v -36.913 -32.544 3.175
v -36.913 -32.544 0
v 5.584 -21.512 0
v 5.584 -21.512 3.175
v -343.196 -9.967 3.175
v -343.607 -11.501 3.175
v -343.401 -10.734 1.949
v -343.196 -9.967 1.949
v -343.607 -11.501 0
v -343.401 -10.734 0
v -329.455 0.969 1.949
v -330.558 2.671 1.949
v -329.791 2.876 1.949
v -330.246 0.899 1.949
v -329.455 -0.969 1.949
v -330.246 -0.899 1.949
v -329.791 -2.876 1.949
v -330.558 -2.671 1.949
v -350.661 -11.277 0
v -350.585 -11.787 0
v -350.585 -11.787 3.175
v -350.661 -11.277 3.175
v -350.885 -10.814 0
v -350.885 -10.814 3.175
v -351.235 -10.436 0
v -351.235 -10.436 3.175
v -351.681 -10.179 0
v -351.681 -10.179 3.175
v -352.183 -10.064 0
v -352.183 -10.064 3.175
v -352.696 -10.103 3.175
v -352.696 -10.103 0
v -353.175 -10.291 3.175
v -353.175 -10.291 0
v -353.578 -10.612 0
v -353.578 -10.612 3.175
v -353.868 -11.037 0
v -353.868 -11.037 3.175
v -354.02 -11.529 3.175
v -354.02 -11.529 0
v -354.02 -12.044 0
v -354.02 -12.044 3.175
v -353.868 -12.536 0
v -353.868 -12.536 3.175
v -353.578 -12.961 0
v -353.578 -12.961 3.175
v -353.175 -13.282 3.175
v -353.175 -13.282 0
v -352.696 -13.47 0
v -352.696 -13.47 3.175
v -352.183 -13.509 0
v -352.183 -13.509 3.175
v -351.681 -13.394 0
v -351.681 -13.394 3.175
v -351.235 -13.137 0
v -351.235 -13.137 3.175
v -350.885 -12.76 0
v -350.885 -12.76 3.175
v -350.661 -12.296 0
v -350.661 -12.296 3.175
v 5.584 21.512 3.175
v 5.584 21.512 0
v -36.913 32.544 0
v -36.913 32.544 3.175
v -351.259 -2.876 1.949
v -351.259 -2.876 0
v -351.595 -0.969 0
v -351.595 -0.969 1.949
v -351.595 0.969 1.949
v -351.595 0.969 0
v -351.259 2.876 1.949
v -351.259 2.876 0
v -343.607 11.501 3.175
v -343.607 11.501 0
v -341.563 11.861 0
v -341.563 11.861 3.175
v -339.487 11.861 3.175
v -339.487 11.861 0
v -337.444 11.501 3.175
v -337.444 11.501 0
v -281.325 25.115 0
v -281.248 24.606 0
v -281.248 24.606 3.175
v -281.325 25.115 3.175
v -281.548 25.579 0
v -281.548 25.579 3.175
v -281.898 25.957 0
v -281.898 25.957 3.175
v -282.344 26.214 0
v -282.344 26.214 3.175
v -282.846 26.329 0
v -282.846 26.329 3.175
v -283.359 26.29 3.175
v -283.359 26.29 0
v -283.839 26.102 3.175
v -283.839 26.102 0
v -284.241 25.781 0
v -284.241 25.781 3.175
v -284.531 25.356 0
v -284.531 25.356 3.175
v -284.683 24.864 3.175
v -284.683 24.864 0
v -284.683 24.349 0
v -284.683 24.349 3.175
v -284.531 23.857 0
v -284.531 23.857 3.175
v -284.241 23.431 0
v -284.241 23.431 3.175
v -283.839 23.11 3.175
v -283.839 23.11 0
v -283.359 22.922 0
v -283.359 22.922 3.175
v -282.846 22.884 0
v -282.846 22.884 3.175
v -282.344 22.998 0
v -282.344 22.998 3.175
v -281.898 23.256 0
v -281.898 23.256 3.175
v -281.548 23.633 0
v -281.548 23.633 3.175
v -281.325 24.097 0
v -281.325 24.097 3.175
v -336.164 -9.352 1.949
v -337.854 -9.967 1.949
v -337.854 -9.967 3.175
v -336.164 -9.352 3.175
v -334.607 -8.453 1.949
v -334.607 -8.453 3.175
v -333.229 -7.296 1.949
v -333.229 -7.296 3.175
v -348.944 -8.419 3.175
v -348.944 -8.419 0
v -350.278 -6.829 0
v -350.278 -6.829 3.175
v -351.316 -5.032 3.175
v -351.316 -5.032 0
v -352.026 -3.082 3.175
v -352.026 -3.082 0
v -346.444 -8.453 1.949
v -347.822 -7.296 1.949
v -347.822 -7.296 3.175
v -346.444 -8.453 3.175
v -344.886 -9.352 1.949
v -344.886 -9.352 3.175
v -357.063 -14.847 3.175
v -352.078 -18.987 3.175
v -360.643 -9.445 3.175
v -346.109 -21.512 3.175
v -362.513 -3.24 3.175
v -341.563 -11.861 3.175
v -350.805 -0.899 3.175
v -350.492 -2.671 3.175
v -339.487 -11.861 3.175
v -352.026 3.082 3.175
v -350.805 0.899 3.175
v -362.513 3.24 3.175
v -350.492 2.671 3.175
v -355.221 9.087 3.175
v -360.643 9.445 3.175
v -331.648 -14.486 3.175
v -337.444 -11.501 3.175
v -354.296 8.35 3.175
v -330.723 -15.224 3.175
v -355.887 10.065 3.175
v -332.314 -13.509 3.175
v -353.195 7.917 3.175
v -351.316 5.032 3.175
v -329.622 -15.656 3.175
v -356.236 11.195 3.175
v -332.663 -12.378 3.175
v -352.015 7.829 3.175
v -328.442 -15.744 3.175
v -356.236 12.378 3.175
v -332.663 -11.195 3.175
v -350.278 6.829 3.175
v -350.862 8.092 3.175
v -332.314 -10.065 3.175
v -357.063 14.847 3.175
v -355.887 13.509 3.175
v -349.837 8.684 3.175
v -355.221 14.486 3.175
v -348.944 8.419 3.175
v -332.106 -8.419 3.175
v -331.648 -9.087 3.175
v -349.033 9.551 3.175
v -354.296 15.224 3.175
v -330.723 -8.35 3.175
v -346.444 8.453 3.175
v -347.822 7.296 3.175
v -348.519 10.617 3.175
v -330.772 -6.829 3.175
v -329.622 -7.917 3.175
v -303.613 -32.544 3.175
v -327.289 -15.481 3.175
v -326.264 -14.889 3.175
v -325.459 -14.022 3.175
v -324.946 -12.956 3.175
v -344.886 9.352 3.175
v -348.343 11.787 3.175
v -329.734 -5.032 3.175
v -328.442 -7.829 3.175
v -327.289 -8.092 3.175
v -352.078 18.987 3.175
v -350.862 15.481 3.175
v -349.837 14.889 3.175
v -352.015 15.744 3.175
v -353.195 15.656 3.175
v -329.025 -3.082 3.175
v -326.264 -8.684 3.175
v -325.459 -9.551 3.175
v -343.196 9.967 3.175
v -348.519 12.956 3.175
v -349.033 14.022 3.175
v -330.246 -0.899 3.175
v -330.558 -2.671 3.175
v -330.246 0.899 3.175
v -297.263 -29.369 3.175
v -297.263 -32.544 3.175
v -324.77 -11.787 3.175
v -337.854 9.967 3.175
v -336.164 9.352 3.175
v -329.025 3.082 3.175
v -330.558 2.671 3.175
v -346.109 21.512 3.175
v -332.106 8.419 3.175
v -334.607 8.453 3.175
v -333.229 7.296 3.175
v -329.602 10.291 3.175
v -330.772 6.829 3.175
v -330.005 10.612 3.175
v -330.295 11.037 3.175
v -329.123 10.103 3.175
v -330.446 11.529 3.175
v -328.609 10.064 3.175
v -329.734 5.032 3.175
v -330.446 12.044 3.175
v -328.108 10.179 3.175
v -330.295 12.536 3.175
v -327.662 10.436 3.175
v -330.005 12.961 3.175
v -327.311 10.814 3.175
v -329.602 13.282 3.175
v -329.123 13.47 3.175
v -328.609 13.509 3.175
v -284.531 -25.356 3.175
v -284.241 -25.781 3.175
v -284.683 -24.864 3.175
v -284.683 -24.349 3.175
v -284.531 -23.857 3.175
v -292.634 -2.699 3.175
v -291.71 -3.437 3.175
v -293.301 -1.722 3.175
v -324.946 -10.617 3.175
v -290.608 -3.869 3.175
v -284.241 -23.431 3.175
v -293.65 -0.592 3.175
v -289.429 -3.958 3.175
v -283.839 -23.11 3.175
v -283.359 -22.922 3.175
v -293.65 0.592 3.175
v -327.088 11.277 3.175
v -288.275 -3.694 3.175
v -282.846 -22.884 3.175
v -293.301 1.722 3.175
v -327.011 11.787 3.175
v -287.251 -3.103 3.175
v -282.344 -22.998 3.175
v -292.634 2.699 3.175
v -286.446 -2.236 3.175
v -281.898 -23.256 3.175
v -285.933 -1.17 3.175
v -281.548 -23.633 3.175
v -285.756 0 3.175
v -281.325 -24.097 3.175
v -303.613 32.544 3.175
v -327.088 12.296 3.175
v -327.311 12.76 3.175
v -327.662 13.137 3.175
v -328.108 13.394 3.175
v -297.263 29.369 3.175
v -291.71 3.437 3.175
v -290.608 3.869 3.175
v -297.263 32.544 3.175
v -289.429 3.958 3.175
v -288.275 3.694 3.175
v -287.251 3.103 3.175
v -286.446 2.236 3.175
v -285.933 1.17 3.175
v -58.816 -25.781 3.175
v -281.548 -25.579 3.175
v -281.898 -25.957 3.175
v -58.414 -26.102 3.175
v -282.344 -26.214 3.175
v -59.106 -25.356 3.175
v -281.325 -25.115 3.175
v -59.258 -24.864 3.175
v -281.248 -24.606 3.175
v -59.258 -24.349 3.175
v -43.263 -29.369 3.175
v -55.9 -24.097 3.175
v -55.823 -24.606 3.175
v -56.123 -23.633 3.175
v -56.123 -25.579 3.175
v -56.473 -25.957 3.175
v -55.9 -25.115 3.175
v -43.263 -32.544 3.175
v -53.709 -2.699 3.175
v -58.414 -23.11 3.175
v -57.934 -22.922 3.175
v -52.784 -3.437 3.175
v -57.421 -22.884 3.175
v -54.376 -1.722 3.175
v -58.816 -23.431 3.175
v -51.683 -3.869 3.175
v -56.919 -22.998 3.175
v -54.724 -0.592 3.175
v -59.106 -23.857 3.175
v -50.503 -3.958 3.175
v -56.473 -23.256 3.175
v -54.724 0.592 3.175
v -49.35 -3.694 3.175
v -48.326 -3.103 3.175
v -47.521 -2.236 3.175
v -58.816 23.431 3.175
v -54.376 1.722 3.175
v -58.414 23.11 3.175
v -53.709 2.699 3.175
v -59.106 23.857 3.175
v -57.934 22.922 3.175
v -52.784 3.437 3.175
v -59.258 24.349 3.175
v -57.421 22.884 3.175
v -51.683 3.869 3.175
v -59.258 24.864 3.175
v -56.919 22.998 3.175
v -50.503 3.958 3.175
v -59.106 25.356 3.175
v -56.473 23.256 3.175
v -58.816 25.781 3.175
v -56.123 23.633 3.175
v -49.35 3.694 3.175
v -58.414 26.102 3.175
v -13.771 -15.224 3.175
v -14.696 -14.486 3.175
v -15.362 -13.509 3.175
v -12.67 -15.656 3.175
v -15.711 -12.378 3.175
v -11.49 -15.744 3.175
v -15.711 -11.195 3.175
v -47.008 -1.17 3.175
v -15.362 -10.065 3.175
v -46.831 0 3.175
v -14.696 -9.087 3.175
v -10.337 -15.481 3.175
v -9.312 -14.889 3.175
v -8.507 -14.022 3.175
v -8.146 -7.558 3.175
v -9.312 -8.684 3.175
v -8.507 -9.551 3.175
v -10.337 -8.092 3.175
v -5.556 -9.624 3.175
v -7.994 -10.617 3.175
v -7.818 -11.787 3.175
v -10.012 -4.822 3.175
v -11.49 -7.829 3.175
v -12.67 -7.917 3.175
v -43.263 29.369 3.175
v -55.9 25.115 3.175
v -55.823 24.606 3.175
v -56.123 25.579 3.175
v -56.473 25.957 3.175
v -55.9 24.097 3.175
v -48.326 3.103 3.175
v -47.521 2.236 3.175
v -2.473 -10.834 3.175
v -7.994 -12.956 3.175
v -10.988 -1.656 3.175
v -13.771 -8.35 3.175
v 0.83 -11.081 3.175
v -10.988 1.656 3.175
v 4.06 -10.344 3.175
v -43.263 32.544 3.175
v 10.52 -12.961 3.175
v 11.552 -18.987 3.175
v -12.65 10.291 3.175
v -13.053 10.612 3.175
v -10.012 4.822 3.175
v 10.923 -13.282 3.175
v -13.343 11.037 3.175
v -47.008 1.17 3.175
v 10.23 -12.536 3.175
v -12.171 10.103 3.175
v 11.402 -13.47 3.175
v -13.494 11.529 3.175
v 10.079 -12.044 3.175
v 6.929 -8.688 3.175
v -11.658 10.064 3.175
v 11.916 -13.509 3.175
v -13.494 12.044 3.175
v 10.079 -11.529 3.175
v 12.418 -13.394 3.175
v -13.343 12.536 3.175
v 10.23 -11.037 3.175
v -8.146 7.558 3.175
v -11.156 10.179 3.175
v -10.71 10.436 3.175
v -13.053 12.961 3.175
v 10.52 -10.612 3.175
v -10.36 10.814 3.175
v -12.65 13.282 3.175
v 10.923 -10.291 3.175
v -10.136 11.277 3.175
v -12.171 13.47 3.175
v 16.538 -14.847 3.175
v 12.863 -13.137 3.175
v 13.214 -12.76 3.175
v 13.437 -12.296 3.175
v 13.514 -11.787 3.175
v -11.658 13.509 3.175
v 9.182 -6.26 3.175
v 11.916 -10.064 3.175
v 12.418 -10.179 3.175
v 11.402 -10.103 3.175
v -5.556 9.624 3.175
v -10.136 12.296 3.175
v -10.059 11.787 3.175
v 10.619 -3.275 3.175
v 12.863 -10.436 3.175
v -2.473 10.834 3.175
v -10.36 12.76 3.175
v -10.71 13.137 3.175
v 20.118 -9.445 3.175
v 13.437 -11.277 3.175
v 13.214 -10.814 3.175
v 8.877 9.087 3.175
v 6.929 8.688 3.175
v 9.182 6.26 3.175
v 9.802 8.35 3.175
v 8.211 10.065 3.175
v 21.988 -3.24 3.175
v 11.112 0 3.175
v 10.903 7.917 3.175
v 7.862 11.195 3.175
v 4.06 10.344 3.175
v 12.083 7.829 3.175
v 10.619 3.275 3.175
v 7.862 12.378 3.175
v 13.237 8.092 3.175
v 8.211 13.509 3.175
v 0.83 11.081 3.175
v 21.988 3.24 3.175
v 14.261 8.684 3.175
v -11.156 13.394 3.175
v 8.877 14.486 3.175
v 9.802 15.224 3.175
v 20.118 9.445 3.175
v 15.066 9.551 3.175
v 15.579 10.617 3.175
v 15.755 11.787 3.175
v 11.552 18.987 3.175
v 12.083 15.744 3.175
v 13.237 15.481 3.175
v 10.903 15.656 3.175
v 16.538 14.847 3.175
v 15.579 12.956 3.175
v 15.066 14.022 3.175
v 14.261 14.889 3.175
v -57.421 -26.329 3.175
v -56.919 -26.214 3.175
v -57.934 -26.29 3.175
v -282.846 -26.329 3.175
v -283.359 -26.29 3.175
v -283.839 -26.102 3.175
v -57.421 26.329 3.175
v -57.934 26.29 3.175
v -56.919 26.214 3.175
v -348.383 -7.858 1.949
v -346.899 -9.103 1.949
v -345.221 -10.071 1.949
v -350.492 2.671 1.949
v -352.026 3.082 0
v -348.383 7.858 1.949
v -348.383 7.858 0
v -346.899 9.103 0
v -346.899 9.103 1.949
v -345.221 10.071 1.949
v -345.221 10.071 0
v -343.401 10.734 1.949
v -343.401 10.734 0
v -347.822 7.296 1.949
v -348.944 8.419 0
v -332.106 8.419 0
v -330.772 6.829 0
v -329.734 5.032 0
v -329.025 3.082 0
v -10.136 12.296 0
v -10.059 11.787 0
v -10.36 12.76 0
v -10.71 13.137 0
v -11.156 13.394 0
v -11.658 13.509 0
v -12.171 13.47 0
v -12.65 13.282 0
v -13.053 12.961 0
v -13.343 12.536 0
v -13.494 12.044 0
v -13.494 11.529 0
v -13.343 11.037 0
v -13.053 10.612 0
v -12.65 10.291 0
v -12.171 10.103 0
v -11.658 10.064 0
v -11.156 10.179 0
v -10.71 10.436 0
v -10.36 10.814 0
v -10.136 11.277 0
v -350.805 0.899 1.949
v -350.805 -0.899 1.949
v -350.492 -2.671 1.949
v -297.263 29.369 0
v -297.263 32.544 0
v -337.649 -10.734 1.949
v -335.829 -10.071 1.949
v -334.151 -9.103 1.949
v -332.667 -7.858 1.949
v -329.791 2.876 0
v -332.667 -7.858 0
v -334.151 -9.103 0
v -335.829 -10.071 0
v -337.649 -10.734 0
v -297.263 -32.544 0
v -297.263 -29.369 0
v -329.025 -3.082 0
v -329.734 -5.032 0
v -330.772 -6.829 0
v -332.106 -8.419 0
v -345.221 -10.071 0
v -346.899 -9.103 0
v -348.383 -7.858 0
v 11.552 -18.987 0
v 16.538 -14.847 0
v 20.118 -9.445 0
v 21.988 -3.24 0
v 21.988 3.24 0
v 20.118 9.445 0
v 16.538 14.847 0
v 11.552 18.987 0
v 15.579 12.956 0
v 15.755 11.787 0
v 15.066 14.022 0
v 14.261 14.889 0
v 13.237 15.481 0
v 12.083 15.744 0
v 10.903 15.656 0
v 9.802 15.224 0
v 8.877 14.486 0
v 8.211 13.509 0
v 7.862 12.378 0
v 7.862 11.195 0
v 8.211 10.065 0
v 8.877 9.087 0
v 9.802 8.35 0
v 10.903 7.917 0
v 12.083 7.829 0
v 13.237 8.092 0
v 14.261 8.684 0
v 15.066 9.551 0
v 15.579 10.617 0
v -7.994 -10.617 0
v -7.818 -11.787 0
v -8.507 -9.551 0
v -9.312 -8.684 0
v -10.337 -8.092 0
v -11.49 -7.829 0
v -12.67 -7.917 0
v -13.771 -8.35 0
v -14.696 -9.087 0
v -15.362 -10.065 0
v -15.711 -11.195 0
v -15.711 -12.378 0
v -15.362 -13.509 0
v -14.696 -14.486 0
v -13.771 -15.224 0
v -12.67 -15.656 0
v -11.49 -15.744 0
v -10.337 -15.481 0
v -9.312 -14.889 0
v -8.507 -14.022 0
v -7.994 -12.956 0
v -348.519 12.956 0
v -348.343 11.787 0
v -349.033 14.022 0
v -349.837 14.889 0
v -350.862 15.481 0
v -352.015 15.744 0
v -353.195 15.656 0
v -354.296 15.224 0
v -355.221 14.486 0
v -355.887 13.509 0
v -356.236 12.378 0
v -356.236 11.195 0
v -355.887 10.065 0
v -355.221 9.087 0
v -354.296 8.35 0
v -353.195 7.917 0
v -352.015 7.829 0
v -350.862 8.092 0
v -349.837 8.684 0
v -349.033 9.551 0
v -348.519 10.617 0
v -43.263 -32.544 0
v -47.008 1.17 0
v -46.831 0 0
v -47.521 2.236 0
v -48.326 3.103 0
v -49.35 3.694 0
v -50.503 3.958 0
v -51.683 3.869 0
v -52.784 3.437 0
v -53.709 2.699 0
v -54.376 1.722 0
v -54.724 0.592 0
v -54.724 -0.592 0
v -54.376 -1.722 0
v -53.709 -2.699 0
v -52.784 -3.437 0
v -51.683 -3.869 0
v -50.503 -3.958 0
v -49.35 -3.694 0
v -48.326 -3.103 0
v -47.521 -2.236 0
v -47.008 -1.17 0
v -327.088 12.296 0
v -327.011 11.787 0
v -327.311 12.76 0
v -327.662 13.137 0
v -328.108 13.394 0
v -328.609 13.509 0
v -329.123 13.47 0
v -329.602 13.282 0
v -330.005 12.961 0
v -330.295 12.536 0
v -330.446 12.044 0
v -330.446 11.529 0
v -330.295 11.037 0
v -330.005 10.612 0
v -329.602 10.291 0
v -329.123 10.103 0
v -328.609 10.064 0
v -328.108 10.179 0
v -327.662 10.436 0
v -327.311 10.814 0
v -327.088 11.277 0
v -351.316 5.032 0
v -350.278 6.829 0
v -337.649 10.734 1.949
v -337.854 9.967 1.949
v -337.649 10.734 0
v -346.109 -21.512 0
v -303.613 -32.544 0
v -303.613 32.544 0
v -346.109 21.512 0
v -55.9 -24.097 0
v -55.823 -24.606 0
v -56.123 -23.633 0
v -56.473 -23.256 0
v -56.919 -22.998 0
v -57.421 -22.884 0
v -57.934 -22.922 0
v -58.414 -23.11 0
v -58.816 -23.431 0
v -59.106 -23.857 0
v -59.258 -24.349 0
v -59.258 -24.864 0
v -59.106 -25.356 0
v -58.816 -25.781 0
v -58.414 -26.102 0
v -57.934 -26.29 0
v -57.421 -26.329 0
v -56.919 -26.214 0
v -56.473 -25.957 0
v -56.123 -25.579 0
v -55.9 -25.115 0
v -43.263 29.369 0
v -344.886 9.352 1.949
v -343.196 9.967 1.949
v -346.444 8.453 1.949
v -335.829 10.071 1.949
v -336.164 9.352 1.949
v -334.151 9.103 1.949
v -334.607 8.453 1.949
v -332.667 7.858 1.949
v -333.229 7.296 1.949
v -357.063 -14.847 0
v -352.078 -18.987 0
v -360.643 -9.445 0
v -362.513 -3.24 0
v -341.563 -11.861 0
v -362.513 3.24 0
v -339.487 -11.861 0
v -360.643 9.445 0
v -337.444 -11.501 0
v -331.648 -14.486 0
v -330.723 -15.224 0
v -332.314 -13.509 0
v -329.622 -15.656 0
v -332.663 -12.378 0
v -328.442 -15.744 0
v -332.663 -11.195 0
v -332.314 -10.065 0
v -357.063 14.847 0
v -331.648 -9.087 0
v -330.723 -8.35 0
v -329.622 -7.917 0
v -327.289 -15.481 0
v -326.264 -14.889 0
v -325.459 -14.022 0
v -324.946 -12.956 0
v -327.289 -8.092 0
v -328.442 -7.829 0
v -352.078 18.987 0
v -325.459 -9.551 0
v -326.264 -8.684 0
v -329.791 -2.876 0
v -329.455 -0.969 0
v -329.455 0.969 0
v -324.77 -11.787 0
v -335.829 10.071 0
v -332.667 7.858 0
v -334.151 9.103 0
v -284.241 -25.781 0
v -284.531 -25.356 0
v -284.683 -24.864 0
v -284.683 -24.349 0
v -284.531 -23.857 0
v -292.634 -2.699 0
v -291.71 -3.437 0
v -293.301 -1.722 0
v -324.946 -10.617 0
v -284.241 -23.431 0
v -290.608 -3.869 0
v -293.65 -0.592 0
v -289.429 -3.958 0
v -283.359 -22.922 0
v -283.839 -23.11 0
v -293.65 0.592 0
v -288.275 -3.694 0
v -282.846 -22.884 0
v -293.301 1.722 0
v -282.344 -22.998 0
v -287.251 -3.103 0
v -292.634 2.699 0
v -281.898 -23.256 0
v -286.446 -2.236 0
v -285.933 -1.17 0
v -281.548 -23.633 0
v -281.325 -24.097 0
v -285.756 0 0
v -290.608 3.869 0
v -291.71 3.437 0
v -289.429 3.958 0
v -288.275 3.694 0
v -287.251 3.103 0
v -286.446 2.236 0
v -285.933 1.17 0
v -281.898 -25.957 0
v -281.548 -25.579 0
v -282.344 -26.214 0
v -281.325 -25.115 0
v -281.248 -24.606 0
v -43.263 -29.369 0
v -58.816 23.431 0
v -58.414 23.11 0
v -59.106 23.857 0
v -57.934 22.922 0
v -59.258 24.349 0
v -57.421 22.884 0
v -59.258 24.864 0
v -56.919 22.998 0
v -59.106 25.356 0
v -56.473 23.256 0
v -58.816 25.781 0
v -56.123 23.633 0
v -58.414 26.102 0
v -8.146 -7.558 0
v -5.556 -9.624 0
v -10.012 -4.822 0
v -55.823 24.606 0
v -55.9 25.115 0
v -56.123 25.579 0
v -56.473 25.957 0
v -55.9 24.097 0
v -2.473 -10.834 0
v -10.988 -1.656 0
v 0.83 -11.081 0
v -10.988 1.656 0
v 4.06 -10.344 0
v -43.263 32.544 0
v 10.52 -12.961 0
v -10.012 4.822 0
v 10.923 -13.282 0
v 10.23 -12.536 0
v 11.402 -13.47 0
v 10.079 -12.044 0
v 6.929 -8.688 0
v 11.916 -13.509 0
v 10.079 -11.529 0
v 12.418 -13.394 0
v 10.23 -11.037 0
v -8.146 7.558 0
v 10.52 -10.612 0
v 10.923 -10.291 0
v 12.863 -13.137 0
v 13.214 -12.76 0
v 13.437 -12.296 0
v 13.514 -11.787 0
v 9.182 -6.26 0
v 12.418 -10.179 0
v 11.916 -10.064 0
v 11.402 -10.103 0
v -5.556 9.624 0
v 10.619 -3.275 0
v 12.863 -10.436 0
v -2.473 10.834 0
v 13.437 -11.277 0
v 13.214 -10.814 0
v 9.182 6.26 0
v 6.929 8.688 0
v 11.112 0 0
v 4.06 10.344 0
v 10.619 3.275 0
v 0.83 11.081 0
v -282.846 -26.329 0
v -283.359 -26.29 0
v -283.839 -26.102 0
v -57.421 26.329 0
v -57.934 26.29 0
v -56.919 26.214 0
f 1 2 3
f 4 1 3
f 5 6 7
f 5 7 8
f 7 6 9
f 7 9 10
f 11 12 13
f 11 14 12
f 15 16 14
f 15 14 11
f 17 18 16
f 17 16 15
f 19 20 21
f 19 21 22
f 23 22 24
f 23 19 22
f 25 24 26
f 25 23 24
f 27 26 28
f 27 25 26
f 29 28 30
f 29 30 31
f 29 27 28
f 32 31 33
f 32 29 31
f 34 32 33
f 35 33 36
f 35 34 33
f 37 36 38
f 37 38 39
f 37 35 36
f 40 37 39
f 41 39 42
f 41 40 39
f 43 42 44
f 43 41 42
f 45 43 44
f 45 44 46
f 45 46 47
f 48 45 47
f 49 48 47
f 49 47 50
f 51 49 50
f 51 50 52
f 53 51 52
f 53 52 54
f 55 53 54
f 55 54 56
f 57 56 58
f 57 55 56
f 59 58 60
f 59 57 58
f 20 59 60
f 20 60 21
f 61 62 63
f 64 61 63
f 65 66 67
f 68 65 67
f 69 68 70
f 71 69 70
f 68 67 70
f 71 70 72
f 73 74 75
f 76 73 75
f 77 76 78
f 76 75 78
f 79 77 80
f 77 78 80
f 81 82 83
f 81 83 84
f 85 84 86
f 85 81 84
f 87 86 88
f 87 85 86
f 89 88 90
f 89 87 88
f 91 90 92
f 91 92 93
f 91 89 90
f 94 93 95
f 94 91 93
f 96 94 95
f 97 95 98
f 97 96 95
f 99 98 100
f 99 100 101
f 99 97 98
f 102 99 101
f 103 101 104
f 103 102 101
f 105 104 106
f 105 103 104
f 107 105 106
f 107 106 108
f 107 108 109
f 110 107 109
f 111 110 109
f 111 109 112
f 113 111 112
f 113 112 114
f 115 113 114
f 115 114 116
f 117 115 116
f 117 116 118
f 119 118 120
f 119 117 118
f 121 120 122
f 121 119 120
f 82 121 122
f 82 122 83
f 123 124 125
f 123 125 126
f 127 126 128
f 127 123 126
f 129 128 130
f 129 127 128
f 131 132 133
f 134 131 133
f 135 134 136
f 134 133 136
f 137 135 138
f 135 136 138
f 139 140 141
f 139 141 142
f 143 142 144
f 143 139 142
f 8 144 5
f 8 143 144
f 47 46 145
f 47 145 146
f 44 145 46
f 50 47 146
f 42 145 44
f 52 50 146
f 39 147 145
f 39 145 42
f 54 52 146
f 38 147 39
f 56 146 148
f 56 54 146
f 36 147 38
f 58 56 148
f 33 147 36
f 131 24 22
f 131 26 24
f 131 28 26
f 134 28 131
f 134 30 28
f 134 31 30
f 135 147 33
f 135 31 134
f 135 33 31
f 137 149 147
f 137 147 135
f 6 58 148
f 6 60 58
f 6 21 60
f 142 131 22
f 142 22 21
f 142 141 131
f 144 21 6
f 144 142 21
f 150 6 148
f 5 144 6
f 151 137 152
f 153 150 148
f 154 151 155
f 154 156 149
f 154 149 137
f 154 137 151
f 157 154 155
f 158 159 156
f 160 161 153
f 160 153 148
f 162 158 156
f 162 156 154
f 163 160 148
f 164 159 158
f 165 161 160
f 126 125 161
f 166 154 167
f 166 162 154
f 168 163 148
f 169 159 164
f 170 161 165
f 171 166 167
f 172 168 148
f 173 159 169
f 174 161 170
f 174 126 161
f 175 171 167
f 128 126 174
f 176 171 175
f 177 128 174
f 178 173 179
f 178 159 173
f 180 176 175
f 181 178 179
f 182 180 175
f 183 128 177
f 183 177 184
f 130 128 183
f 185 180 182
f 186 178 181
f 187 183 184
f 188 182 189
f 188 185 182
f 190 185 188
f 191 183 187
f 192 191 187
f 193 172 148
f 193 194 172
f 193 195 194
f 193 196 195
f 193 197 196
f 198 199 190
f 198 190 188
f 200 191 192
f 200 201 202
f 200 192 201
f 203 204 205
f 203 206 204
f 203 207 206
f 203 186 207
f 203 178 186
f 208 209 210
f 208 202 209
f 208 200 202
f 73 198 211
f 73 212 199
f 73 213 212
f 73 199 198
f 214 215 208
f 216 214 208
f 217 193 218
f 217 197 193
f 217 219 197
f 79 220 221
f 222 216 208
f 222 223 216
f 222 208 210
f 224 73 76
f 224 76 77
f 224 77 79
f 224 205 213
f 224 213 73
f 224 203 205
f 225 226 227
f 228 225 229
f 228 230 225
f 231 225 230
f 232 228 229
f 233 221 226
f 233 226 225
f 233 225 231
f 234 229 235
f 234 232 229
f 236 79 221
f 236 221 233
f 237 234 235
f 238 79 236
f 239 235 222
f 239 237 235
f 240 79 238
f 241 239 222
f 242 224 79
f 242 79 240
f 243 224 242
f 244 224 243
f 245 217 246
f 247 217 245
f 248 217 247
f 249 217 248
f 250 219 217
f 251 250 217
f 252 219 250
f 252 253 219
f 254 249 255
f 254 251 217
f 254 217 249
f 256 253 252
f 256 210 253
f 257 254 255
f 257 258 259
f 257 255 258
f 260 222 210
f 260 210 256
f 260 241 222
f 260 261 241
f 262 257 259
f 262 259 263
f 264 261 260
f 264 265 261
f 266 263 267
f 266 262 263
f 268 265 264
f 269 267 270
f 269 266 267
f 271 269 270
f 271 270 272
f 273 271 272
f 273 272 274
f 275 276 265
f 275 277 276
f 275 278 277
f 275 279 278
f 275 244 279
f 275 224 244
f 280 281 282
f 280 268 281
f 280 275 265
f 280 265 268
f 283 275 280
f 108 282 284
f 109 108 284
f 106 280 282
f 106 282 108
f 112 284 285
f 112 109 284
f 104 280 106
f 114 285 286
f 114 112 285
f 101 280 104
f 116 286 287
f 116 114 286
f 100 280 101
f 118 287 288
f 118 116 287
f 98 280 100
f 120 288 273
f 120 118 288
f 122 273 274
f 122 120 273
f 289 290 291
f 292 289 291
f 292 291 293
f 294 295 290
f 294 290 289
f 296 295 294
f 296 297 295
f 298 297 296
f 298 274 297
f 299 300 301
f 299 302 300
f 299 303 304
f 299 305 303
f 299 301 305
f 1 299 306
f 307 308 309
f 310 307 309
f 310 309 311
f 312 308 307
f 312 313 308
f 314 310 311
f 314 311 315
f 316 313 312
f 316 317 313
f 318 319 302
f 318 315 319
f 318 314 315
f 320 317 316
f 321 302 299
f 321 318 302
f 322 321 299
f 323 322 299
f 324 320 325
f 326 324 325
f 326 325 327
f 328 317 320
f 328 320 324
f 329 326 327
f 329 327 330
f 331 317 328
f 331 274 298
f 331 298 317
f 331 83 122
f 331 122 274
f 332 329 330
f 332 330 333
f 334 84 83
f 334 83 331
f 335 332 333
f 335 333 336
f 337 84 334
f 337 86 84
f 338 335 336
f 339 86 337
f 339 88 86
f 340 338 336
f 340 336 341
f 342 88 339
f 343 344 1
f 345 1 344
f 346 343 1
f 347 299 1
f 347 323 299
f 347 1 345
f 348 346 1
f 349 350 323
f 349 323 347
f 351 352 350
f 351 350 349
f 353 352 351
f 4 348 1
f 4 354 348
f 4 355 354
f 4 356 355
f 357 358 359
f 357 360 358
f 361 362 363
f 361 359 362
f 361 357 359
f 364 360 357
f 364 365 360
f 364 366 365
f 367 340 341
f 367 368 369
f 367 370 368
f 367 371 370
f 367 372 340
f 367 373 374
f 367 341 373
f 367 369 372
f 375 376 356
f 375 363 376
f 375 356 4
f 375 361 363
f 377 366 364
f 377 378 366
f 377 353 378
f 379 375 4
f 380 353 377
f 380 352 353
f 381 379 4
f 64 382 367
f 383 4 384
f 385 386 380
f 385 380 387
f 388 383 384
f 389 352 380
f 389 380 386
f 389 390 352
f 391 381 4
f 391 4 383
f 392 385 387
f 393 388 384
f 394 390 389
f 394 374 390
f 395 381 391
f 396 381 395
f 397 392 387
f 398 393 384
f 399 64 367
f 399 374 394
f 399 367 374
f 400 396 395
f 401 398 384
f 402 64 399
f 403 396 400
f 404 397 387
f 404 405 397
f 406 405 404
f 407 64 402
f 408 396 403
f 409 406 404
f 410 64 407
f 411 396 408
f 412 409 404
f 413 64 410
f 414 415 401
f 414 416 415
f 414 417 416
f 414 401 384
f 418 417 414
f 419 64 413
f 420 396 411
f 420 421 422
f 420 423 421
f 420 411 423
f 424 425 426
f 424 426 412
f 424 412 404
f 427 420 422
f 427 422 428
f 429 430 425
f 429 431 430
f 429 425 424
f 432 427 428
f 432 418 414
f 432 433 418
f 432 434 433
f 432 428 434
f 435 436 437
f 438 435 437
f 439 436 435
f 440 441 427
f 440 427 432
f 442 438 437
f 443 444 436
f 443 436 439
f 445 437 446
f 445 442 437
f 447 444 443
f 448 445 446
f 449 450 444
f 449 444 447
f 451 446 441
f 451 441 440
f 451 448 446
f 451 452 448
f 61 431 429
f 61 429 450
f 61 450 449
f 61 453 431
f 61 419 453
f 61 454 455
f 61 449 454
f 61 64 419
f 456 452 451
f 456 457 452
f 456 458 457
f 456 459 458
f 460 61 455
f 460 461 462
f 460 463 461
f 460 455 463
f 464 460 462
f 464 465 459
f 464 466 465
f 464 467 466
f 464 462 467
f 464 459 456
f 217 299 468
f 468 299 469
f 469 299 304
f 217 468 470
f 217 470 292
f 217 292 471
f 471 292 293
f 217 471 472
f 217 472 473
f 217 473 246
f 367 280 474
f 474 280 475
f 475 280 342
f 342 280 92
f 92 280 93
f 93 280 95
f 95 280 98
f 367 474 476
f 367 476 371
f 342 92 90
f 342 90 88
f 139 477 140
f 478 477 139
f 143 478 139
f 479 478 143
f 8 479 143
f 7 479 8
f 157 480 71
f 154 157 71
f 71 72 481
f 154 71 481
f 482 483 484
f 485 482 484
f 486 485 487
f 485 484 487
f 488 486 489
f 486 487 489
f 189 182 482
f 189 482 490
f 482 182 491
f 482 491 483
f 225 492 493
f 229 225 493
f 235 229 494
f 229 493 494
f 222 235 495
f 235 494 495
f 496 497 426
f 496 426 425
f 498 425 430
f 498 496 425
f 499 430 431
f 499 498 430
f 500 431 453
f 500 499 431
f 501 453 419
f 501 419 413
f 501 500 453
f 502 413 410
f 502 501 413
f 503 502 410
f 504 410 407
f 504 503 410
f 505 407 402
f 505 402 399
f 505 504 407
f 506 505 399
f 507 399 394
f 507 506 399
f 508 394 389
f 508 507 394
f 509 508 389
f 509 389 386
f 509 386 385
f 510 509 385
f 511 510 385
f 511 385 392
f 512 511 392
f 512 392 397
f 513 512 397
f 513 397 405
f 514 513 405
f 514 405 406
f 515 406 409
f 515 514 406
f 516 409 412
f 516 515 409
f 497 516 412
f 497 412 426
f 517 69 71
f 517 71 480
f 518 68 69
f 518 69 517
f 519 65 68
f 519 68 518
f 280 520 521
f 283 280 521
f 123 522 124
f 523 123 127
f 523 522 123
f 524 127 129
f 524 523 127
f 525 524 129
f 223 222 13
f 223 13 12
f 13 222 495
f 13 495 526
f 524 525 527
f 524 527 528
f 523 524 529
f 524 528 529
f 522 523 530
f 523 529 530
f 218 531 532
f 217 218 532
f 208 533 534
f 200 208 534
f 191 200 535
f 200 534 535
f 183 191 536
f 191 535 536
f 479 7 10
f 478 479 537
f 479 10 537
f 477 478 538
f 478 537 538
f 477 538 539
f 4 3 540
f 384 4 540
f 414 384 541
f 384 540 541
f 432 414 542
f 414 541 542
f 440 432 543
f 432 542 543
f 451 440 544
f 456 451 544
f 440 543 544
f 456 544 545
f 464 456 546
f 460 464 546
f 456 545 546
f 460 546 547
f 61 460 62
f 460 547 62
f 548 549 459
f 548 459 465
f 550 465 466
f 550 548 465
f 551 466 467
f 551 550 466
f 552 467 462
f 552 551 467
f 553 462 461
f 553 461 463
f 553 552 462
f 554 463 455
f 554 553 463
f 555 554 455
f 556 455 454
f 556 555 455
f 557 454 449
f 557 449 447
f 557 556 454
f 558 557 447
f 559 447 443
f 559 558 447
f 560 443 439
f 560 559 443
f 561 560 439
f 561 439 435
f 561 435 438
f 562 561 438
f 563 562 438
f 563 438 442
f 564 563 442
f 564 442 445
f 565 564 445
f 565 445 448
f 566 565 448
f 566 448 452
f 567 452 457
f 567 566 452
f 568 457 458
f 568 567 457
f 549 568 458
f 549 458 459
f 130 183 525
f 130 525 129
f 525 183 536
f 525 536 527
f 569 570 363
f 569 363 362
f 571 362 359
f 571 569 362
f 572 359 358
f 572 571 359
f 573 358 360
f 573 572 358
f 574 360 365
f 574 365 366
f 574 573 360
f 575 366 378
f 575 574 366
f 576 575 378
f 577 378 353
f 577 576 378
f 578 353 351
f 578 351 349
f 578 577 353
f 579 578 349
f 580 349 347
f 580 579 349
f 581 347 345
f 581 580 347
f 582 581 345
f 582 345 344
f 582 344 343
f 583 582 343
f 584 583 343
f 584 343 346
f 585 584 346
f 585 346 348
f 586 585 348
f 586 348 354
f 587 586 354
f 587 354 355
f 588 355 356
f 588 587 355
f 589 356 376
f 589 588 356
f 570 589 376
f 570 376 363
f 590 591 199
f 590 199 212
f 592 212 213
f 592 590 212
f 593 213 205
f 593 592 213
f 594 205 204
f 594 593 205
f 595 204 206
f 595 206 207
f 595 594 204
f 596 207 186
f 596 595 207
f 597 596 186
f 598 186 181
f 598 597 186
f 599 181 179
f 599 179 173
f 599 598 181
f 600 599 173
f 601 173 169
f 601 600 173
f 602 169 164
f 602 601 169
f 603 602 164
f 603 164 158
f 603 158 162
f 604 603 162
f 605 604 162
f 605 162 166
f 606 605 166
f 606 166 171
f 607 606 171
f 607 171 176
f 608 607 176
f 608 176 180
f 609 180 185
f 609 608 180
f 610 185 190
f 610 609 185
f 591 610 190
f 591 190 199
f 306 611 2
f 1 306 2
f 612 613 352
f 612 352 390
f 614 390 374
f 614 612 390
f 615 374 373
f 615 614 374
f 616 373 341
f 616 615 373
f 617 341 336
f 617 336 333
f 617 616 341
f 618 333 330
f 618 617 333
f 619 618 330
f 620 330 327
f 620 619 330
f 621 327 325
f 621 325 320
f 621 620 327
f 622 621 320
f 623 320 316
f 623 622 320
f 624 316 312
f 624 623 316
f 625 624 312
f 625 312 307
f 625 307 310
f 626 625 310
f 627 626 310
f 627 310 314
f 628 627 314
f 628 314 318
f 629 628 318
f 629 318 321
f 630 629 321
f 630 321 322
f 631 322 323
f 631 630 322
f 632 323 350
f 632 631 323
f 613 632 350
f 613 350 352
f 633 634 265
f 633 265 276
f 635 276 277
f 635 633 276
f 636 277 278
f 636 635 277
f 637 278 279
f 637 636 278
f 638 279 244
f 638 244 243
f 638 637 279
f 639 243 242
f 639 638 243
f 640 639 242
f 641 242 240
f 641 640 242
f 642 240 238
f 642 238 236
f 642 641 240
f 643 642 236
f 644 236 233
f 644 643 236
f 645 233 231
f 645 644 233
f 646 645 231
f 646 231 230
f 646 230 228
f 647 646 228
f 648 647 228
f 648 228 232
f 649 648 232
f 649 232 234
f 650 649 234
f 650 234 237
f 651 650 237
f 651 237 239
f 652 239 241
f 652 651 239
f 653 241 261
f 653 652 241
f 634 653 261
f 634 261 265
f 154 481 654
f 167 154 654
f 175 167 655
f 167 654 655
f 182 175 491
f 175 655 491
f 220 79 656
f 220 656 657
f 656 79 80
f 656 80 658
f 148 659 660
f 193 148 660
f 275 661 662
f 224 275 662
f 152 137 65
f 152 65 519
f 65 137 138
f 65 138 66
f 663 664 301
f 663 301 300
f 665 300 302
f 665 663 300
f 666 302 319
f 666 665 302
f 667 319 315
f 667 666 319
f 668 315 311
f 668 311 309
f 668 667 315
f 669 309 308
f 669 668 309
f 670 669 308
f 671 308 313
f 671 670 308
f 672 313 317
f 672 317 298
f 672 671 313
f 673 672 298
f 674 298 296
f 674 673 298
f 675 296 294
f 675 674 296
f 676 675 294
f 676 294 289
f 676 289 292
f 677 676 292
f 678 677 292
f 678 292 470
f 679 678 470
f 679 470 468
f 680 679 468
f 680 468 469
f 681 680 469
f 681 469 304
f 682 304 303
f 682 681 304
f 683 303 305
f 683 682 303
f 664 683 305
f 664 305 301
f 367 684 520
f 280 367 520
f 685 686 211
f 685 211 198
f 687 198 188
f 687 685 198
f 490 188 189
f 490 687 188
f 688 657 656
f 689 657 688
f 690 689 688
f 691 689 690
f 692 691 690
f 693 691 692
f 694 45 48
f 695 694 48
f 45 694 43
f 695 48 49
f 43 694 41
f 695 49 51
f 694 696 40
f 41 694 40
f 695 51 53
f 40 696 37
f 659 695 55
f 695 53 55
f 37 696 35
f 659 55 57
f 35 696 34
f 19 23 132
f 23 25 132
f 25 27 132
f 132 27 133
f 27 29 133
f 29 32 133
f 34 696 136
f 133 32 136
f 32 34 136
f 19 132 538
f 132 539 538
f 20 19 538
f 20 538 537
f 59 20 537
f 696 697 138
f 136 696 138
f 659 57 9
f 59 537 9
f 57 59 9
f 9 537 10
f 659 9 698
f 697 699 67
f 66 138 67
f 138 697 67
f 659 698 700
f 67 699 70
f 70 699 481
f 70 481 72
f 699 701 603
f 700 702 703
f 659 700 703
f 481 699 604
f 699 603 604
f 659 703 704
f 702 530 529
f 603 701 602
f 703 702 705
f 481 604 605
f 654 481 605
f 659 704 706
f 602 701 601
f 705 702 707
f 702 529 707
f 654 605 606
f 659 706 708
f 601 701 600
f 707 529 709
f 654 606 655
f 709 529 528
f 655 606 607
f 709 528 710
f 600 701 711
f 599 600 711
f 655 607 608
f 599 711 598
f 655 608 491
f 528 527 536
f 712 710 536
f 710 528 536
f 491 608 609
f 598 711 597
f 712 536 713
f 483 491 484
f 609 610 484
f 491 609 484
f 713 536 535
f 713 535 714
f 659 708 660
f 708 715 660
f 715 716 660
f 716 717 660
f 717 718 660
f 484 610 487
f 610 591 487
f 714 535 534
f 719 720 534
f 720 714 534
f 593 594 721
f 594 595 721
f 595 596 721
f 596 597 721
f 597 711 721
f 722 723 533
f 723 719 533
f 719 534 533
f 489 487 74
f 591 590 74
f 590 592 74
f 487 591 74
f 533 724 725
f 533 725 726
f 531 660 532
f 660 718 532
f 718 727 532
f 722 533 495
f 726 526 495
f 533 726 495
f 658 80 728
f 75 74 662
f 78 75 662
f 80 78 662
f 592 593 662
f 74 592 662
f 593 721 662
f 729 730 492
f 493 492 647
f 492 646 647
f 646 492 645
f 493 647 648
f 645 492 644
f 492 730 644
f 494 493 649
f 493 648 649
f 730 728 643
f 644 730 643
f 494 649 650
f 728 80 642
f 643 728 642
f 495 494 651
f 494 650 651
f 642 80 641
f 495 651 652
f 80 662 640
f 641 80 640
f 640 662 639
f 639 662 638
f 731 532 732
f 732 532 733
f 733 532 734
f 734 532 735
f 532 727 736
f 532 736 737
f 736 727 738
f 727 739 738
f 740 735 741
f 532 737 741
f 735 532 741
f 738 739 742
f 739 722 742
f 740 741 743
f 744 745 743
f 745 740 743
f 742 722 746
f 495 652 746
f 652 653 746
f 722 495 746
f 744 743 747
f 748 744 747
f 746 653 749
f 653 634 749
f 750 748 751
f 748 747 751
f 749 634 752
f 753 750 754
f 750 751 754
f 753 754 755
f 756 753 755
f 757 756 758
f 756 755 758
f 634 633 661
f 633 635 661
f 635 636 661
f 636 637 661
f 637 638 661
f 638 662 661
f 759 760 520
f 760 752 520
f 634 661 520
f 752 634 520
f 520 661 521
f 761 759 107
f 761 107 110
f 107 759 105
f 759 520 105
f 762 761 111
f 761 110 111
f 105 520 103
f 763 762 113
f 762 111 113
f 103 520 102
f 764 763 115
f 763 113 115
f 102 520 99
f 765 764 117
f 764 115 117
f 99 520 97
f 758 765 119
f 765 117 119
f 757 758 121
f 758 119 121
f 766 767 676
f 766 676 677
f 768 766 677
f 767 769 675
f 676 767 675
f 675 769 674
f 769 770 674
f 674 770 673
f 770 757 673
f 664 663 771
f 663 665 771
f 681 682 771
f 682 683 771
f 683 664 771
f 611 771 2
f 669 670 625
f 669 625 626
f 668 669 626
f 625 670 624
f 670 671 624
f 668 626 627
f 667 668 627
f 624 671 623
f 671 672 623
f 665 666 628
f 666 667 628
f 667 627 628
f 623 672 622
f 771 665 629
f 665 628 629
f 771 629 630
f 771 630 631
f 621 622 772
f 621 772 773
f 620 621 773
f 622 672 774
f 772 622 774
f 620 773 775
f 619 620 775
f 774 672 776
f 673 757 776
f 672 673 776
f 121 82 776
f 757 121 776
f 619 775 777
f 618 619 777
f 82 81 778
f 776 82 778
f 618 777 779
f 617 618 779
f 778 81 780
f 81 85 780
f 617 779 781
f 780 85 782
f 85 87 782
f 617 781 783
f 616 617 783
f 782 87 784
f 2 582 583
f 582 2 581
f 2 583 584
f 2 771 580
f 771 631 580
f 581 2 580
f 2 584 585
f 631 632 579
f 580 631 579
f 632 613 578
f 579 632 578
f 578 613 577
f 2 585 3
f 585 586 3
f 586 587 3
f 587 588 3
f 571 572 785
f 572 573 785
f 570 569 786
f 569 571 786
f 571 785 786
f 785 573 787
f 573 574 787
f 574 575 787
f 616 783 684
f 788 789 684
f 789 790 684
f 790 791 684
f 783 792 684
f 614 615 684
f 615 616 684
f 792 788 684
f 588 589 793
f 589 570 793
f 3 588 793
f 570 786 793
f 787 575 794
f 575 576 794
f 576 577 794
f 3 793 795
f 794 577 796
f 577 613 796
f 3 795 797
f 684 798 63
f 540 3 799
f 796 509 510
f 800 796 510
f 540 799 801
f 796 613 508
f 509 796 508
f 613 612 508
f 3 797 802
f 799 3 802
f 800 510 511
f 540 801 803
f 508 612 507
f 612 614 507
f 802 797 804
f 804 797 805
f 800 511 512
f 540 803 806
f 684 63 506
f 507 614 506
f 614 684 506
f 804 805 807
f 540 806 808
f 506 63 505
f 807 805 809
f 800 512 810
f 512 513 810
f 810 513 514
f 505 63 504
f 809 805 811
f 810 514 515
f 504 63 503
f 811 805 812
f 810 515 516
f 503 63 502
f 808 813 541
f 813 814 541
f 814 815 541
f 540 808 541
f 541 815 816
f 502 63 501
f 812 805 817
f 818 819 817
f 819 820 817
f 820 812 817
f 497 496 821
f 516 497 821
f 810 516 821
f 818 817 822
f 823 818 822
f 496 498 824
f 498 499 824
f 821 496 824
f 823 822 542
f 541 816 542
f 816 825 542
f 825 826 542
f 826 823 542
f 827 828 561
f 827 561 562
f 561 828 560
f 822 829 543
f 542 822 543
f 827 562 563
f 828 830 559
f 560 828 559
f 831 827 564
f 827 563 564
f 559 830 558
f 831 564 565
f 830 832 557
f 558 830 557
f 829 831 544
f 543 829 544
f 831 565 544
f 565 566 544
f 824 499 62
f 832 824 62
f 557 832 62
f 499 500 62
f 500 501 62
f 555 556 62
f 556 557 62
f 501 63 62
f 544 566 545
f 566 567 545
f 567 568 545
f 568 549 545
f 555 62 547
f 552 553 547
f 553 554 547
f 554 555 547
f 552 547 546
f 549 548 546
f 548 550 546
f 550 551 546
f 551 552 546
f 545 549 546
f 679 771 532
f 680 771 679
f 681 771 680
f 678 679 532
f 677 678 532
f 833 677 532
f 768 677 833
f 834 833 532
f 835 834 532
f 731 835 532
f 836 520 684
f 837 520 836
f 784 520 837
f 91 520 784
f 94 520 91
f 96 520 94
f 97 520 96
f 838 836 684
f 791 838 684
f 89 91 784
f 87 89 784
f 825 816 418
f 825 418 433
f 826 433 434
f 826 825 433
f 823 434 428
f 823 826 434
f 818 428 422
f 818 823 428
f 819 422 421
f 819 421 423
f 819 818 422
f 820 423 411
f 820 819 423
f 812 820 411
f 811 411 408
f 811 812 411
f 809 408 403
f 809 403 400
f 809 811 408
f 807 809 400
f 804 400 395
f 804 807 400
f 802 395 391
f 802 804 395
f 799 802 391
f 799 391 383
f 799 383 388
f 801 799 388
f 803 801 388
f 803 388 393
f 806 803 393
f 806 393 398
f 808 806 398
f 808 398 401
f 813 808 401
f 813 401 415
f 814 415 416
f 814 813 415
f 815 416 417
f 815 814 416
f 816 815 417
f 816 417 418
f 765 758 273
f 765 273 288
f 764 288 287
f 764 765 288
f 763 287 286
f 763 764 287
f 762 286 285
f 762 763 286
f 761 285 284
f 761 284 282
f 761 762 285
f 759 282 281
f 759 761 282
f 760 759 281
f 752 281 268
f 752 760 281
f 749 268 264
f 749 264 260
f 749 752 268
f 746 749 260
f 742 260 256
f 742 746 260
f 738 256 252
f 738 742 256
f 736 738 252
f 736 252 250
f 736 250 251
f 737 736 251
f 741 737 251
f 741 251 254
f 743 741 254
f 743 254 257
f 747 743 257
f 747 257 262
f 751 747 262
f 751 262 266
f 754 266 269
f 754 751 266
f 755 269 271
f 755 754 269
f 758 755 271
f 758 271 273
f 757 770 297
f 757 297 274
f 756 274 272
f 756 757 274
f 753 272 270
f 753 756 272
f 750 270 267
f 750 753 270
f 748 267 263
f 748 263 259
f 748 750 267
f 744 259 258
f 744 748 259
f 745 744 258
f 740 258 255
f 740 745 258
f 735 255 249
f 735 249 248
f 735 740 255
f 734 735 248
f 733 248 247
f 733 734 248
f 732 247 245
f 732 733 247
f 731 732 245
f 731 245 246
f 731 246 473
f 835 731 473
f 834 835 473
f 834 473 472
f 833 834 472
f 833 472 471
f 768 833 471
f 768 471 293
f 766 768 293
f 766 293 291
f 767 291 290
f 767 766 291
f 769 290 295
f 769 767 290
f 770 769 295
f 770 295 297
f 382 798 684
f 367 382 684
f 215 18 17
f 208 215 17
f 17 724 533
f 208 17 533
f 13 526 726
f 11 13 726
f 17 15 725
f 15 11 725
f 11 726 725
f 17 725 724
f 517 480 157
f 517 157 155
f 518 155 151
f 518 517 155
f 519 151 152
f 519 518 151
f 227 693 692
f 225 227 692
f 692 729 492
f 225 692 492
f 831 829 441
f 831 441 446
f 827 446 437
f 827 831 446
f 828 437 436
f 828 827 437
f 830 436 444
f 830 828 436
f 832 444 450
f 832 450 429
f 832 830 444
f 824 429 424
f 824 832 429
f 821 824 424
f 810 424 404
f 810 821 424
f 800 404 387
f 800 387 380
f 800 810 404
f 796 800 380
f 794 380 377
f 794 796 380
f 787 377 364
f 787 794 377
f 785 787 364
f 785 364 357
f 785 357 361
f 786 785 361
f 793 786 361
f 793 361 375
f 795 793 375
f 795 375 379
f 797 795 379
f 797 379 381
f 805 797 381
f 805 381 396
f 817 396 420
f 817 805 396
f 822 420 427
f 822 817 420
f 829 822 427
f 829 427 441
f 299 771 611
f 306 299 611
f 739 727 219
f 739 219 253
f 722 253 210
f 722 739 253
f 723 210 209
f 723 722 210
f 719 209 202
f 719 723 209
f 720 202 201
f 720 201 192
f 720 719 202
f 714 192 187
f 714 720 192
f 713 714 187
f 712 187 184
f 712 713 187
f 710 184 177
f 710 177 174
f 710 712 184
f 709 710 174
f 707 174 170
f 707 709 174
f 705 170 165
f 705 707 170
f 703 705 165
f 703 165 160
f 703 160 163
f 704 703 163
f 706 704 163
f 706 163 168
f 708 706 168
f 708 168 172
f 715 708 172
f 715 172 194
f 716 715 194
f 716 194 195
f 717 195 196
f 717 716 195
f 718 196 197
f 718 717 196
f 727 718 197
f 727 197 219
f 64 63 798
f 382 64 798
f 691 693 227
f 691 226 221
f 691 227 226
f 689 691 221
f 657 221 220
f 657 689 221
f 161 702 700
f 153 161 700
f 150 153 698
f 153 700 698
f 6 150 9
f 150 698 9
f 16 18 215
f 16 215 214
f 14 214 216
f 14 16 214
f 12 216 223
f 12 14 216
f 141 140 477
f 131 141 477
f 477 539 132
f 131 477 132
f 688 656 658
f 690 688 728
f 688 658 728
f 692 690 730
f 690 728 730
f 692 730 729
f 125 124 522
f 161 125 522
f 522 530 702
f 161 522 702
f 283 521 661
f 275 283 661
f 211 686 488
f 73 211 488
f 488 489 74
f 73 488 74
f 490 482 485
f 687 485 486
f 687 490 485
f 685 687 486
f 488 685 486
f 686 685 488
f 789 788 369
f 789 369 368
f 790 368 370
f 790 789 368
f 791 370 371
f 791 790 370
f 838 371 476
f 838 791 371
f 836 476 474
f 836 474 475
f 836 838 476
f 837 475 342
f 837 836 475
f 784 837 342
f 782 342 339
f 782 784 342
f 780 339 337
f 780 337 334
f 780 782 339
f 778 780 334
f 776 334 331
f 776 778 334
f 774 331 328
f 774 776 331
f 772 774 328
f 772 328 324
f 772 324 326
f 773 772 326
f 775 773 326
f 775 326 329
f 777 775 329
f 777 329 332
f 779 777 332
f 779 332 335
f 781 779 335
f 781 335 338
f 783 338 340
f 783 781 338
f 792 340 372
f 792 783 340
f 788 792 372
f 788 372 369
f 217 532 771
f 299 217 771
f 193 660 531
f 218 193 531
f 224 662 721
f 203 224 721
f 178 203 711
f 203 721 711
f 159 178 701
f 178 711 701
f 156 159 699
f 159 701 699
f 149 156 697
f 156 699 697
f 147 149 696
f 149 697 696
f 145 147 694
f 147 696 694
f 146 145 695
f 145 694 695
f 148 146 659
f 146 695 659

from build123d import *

# Parameters (mm, degrees)
F0_R     = 1.7272
F0_R_2   = 3.96875
F0_R_3   = 10.31875
F0_R_4   = 11.1125
F1_DEPTH = 3.175
F3_DEPTH = 3.175
F4_COUNT = 6
F4_ANGLE = 300
F5_R     = 11.1125
F6_DEPTH = 1.94945


with BuildPart() as f1:
    # F0 (on Top) → F1 (new body)
    with BuildSketch(Plane.XY):
        with BuildLine():
            Line((-303.6125627, 32.54375), (-346.1094200534, 21.5120031198))
            ThreePointArc((-346.1094200534, 21.5120031198), (-362.7501254, 0), (-346.1094200534, -21.5120031198))
            Line((-346.1094200534, -21.5120031198), (-303.6125627, -32.54375))
            Line((-303.6125627, -32.54375), (-297.2625627, -32.54375))
            Line((-297.2625627, -32.54375), (-297.2625627, -29.36875))
            Line((-297.2625627, -29.36875), (-43.2625627, -29.36875))
            Line((-43.2625627, -29.36875), (-43.2625627, -32.54375))
            Line((-43.2625627, -32.54375), (-36.9125627, -32.54375))
            Line((-36.9125627, -32.54375), (5.5842946534, -21.5120031198))
            ThreePointArc((5.5842946534, -21.5120031198), (22.225, 0), (5.5842946534, 21.5120031198))
            Line((5.5842946534, 21.5120031198), (-36.9125627, 32.54375))
            Line((-36.9125627, 32.54375), (-43.2625627, 32.54375))
            Line((-43.2625627, 32.54375), (-43.2625627, 29.36875))
            Line((-43.2625627, 29.36875), (-297.2625627, 29.36875))
            Line((-297.2625627, 29.36875), (-297.2625627, 32.54375))
            Line((-297.2625627, 32.54375), (-303.6125627, 32.54375))
        make_face()
        with Locations((-282.9750627, -24.60625)):
            Circle(F0_R, mode=Mode.SUBTRACT)
        with Locations((-352.3117115589, -11.7865861589)):
            Circle(F0_R, mode=Mode.SUBTRACT)
        with Locations((-328.7385392411, -11.7865861589)):
            Circle(F0_R_2, mode=Mode.SUBTRACT)
        with Locations((-57.5500627, -24.60625)):
            Circle(F0_R, mode=Mode.SUBTRACT)
        with Locations((-11.7865861589, -11.7865861589)):
            Circle(F0_R_2, mode=Mode.SUBTRACT)
        with Locations((11.7865861589, -11.7865861589)):
            Circle(F0_R, mode=Mode.SUBTRACT)
        with Locations((-340.5251254, 0)):
            Circle(F0_R_3, mode=Mode.SUBTRACT)
        with Locations((-289.7251254, 0)):
            Circle(F0_R_2, mode=Mode.SUBTRACT)
        with Locations((-352.3117115589, 11.7865861589)):
            Circle(F0_R_2, mode=Mode.SUBTRACT)
        with Locations((-328.7385392411, 11.7865861589)):
            Circle(F0_R, mode=Mode.SUBTRACT)
        with Locations((-282.9750627, 24.60625)):
            Circle(F0_R, mode=Mode.SUBTRACT)
        with Locations((-50.8, 0)):
            Circle(F0_R_2, mode=Mode.SUBTRACT)
        Circle(F0_R_4, mode=Mode.SUBTRACT)
        with Locations((-11.7865861589, 11.7865861589)):
            Circle(F0_R, mode=Mode.SUBTRACT)
        with Locations((11.7865861589, 11.7865861589)):
            Circle(F0_R_2, mode=Mode.SUBTRACT)
        with Locations((-57.5500627, 24.60625)):
            Circle(F0_R, mode=Mode.SUBTRACT)
    extrude(amount=F1_DEPTH)

    # F2 (on face) → F3 (cut, through all)
    with BuildSketch(Plane(origin=(0, 0, 0), x_dir=(1, 0, 0), z_dir=(0, 0, -1))):
        with BuildLine():
            ThreePointArc((-347.8215834984, -7.2964580984), (-349.4614250353, -5.159375), (-350.49227252, -2.6706890217))
            Line((-350.49227252, -2.6706890217), (-352.0256797693, -3.0815642558))
            ThreePointArc((-352.0256797693, -3.0815642558), (-350.8362403638, -5.953125), (-348.9441155135, -8.4189901135))
            Line((-348.9441155135, -8.4189901135), (-347.8215834984, -7.2964580984))
        make_face()
    f3 = extrude(amount=-F3_DEPTH, mode=Mode.SUBTRACT)

    # F4: F3 ×6 about axis
    f4_axis = Axis((-340.5251254, 0, 0), (0, 0, -1))
    for i in range(1, F4_COUNT):
        add(f3.rotate(f4_axis, i * F4_ANGLE / (F4_COUNT - 1)), mode=Mode.SUBTRACT)

    # F5 (on face) → F6 (cut)
    with BuildSketch(Plane(origin=(0, 0, 0), x_dir=(1, 0, 0), z_dir=(0, 0, -1))):
        with Locations((-340.5251254, 0)):
            Circle(F5_R)
    extrude(amount=-F6_DEPTH, mode=Mode.SUBTRACT)


solid = f1.part
